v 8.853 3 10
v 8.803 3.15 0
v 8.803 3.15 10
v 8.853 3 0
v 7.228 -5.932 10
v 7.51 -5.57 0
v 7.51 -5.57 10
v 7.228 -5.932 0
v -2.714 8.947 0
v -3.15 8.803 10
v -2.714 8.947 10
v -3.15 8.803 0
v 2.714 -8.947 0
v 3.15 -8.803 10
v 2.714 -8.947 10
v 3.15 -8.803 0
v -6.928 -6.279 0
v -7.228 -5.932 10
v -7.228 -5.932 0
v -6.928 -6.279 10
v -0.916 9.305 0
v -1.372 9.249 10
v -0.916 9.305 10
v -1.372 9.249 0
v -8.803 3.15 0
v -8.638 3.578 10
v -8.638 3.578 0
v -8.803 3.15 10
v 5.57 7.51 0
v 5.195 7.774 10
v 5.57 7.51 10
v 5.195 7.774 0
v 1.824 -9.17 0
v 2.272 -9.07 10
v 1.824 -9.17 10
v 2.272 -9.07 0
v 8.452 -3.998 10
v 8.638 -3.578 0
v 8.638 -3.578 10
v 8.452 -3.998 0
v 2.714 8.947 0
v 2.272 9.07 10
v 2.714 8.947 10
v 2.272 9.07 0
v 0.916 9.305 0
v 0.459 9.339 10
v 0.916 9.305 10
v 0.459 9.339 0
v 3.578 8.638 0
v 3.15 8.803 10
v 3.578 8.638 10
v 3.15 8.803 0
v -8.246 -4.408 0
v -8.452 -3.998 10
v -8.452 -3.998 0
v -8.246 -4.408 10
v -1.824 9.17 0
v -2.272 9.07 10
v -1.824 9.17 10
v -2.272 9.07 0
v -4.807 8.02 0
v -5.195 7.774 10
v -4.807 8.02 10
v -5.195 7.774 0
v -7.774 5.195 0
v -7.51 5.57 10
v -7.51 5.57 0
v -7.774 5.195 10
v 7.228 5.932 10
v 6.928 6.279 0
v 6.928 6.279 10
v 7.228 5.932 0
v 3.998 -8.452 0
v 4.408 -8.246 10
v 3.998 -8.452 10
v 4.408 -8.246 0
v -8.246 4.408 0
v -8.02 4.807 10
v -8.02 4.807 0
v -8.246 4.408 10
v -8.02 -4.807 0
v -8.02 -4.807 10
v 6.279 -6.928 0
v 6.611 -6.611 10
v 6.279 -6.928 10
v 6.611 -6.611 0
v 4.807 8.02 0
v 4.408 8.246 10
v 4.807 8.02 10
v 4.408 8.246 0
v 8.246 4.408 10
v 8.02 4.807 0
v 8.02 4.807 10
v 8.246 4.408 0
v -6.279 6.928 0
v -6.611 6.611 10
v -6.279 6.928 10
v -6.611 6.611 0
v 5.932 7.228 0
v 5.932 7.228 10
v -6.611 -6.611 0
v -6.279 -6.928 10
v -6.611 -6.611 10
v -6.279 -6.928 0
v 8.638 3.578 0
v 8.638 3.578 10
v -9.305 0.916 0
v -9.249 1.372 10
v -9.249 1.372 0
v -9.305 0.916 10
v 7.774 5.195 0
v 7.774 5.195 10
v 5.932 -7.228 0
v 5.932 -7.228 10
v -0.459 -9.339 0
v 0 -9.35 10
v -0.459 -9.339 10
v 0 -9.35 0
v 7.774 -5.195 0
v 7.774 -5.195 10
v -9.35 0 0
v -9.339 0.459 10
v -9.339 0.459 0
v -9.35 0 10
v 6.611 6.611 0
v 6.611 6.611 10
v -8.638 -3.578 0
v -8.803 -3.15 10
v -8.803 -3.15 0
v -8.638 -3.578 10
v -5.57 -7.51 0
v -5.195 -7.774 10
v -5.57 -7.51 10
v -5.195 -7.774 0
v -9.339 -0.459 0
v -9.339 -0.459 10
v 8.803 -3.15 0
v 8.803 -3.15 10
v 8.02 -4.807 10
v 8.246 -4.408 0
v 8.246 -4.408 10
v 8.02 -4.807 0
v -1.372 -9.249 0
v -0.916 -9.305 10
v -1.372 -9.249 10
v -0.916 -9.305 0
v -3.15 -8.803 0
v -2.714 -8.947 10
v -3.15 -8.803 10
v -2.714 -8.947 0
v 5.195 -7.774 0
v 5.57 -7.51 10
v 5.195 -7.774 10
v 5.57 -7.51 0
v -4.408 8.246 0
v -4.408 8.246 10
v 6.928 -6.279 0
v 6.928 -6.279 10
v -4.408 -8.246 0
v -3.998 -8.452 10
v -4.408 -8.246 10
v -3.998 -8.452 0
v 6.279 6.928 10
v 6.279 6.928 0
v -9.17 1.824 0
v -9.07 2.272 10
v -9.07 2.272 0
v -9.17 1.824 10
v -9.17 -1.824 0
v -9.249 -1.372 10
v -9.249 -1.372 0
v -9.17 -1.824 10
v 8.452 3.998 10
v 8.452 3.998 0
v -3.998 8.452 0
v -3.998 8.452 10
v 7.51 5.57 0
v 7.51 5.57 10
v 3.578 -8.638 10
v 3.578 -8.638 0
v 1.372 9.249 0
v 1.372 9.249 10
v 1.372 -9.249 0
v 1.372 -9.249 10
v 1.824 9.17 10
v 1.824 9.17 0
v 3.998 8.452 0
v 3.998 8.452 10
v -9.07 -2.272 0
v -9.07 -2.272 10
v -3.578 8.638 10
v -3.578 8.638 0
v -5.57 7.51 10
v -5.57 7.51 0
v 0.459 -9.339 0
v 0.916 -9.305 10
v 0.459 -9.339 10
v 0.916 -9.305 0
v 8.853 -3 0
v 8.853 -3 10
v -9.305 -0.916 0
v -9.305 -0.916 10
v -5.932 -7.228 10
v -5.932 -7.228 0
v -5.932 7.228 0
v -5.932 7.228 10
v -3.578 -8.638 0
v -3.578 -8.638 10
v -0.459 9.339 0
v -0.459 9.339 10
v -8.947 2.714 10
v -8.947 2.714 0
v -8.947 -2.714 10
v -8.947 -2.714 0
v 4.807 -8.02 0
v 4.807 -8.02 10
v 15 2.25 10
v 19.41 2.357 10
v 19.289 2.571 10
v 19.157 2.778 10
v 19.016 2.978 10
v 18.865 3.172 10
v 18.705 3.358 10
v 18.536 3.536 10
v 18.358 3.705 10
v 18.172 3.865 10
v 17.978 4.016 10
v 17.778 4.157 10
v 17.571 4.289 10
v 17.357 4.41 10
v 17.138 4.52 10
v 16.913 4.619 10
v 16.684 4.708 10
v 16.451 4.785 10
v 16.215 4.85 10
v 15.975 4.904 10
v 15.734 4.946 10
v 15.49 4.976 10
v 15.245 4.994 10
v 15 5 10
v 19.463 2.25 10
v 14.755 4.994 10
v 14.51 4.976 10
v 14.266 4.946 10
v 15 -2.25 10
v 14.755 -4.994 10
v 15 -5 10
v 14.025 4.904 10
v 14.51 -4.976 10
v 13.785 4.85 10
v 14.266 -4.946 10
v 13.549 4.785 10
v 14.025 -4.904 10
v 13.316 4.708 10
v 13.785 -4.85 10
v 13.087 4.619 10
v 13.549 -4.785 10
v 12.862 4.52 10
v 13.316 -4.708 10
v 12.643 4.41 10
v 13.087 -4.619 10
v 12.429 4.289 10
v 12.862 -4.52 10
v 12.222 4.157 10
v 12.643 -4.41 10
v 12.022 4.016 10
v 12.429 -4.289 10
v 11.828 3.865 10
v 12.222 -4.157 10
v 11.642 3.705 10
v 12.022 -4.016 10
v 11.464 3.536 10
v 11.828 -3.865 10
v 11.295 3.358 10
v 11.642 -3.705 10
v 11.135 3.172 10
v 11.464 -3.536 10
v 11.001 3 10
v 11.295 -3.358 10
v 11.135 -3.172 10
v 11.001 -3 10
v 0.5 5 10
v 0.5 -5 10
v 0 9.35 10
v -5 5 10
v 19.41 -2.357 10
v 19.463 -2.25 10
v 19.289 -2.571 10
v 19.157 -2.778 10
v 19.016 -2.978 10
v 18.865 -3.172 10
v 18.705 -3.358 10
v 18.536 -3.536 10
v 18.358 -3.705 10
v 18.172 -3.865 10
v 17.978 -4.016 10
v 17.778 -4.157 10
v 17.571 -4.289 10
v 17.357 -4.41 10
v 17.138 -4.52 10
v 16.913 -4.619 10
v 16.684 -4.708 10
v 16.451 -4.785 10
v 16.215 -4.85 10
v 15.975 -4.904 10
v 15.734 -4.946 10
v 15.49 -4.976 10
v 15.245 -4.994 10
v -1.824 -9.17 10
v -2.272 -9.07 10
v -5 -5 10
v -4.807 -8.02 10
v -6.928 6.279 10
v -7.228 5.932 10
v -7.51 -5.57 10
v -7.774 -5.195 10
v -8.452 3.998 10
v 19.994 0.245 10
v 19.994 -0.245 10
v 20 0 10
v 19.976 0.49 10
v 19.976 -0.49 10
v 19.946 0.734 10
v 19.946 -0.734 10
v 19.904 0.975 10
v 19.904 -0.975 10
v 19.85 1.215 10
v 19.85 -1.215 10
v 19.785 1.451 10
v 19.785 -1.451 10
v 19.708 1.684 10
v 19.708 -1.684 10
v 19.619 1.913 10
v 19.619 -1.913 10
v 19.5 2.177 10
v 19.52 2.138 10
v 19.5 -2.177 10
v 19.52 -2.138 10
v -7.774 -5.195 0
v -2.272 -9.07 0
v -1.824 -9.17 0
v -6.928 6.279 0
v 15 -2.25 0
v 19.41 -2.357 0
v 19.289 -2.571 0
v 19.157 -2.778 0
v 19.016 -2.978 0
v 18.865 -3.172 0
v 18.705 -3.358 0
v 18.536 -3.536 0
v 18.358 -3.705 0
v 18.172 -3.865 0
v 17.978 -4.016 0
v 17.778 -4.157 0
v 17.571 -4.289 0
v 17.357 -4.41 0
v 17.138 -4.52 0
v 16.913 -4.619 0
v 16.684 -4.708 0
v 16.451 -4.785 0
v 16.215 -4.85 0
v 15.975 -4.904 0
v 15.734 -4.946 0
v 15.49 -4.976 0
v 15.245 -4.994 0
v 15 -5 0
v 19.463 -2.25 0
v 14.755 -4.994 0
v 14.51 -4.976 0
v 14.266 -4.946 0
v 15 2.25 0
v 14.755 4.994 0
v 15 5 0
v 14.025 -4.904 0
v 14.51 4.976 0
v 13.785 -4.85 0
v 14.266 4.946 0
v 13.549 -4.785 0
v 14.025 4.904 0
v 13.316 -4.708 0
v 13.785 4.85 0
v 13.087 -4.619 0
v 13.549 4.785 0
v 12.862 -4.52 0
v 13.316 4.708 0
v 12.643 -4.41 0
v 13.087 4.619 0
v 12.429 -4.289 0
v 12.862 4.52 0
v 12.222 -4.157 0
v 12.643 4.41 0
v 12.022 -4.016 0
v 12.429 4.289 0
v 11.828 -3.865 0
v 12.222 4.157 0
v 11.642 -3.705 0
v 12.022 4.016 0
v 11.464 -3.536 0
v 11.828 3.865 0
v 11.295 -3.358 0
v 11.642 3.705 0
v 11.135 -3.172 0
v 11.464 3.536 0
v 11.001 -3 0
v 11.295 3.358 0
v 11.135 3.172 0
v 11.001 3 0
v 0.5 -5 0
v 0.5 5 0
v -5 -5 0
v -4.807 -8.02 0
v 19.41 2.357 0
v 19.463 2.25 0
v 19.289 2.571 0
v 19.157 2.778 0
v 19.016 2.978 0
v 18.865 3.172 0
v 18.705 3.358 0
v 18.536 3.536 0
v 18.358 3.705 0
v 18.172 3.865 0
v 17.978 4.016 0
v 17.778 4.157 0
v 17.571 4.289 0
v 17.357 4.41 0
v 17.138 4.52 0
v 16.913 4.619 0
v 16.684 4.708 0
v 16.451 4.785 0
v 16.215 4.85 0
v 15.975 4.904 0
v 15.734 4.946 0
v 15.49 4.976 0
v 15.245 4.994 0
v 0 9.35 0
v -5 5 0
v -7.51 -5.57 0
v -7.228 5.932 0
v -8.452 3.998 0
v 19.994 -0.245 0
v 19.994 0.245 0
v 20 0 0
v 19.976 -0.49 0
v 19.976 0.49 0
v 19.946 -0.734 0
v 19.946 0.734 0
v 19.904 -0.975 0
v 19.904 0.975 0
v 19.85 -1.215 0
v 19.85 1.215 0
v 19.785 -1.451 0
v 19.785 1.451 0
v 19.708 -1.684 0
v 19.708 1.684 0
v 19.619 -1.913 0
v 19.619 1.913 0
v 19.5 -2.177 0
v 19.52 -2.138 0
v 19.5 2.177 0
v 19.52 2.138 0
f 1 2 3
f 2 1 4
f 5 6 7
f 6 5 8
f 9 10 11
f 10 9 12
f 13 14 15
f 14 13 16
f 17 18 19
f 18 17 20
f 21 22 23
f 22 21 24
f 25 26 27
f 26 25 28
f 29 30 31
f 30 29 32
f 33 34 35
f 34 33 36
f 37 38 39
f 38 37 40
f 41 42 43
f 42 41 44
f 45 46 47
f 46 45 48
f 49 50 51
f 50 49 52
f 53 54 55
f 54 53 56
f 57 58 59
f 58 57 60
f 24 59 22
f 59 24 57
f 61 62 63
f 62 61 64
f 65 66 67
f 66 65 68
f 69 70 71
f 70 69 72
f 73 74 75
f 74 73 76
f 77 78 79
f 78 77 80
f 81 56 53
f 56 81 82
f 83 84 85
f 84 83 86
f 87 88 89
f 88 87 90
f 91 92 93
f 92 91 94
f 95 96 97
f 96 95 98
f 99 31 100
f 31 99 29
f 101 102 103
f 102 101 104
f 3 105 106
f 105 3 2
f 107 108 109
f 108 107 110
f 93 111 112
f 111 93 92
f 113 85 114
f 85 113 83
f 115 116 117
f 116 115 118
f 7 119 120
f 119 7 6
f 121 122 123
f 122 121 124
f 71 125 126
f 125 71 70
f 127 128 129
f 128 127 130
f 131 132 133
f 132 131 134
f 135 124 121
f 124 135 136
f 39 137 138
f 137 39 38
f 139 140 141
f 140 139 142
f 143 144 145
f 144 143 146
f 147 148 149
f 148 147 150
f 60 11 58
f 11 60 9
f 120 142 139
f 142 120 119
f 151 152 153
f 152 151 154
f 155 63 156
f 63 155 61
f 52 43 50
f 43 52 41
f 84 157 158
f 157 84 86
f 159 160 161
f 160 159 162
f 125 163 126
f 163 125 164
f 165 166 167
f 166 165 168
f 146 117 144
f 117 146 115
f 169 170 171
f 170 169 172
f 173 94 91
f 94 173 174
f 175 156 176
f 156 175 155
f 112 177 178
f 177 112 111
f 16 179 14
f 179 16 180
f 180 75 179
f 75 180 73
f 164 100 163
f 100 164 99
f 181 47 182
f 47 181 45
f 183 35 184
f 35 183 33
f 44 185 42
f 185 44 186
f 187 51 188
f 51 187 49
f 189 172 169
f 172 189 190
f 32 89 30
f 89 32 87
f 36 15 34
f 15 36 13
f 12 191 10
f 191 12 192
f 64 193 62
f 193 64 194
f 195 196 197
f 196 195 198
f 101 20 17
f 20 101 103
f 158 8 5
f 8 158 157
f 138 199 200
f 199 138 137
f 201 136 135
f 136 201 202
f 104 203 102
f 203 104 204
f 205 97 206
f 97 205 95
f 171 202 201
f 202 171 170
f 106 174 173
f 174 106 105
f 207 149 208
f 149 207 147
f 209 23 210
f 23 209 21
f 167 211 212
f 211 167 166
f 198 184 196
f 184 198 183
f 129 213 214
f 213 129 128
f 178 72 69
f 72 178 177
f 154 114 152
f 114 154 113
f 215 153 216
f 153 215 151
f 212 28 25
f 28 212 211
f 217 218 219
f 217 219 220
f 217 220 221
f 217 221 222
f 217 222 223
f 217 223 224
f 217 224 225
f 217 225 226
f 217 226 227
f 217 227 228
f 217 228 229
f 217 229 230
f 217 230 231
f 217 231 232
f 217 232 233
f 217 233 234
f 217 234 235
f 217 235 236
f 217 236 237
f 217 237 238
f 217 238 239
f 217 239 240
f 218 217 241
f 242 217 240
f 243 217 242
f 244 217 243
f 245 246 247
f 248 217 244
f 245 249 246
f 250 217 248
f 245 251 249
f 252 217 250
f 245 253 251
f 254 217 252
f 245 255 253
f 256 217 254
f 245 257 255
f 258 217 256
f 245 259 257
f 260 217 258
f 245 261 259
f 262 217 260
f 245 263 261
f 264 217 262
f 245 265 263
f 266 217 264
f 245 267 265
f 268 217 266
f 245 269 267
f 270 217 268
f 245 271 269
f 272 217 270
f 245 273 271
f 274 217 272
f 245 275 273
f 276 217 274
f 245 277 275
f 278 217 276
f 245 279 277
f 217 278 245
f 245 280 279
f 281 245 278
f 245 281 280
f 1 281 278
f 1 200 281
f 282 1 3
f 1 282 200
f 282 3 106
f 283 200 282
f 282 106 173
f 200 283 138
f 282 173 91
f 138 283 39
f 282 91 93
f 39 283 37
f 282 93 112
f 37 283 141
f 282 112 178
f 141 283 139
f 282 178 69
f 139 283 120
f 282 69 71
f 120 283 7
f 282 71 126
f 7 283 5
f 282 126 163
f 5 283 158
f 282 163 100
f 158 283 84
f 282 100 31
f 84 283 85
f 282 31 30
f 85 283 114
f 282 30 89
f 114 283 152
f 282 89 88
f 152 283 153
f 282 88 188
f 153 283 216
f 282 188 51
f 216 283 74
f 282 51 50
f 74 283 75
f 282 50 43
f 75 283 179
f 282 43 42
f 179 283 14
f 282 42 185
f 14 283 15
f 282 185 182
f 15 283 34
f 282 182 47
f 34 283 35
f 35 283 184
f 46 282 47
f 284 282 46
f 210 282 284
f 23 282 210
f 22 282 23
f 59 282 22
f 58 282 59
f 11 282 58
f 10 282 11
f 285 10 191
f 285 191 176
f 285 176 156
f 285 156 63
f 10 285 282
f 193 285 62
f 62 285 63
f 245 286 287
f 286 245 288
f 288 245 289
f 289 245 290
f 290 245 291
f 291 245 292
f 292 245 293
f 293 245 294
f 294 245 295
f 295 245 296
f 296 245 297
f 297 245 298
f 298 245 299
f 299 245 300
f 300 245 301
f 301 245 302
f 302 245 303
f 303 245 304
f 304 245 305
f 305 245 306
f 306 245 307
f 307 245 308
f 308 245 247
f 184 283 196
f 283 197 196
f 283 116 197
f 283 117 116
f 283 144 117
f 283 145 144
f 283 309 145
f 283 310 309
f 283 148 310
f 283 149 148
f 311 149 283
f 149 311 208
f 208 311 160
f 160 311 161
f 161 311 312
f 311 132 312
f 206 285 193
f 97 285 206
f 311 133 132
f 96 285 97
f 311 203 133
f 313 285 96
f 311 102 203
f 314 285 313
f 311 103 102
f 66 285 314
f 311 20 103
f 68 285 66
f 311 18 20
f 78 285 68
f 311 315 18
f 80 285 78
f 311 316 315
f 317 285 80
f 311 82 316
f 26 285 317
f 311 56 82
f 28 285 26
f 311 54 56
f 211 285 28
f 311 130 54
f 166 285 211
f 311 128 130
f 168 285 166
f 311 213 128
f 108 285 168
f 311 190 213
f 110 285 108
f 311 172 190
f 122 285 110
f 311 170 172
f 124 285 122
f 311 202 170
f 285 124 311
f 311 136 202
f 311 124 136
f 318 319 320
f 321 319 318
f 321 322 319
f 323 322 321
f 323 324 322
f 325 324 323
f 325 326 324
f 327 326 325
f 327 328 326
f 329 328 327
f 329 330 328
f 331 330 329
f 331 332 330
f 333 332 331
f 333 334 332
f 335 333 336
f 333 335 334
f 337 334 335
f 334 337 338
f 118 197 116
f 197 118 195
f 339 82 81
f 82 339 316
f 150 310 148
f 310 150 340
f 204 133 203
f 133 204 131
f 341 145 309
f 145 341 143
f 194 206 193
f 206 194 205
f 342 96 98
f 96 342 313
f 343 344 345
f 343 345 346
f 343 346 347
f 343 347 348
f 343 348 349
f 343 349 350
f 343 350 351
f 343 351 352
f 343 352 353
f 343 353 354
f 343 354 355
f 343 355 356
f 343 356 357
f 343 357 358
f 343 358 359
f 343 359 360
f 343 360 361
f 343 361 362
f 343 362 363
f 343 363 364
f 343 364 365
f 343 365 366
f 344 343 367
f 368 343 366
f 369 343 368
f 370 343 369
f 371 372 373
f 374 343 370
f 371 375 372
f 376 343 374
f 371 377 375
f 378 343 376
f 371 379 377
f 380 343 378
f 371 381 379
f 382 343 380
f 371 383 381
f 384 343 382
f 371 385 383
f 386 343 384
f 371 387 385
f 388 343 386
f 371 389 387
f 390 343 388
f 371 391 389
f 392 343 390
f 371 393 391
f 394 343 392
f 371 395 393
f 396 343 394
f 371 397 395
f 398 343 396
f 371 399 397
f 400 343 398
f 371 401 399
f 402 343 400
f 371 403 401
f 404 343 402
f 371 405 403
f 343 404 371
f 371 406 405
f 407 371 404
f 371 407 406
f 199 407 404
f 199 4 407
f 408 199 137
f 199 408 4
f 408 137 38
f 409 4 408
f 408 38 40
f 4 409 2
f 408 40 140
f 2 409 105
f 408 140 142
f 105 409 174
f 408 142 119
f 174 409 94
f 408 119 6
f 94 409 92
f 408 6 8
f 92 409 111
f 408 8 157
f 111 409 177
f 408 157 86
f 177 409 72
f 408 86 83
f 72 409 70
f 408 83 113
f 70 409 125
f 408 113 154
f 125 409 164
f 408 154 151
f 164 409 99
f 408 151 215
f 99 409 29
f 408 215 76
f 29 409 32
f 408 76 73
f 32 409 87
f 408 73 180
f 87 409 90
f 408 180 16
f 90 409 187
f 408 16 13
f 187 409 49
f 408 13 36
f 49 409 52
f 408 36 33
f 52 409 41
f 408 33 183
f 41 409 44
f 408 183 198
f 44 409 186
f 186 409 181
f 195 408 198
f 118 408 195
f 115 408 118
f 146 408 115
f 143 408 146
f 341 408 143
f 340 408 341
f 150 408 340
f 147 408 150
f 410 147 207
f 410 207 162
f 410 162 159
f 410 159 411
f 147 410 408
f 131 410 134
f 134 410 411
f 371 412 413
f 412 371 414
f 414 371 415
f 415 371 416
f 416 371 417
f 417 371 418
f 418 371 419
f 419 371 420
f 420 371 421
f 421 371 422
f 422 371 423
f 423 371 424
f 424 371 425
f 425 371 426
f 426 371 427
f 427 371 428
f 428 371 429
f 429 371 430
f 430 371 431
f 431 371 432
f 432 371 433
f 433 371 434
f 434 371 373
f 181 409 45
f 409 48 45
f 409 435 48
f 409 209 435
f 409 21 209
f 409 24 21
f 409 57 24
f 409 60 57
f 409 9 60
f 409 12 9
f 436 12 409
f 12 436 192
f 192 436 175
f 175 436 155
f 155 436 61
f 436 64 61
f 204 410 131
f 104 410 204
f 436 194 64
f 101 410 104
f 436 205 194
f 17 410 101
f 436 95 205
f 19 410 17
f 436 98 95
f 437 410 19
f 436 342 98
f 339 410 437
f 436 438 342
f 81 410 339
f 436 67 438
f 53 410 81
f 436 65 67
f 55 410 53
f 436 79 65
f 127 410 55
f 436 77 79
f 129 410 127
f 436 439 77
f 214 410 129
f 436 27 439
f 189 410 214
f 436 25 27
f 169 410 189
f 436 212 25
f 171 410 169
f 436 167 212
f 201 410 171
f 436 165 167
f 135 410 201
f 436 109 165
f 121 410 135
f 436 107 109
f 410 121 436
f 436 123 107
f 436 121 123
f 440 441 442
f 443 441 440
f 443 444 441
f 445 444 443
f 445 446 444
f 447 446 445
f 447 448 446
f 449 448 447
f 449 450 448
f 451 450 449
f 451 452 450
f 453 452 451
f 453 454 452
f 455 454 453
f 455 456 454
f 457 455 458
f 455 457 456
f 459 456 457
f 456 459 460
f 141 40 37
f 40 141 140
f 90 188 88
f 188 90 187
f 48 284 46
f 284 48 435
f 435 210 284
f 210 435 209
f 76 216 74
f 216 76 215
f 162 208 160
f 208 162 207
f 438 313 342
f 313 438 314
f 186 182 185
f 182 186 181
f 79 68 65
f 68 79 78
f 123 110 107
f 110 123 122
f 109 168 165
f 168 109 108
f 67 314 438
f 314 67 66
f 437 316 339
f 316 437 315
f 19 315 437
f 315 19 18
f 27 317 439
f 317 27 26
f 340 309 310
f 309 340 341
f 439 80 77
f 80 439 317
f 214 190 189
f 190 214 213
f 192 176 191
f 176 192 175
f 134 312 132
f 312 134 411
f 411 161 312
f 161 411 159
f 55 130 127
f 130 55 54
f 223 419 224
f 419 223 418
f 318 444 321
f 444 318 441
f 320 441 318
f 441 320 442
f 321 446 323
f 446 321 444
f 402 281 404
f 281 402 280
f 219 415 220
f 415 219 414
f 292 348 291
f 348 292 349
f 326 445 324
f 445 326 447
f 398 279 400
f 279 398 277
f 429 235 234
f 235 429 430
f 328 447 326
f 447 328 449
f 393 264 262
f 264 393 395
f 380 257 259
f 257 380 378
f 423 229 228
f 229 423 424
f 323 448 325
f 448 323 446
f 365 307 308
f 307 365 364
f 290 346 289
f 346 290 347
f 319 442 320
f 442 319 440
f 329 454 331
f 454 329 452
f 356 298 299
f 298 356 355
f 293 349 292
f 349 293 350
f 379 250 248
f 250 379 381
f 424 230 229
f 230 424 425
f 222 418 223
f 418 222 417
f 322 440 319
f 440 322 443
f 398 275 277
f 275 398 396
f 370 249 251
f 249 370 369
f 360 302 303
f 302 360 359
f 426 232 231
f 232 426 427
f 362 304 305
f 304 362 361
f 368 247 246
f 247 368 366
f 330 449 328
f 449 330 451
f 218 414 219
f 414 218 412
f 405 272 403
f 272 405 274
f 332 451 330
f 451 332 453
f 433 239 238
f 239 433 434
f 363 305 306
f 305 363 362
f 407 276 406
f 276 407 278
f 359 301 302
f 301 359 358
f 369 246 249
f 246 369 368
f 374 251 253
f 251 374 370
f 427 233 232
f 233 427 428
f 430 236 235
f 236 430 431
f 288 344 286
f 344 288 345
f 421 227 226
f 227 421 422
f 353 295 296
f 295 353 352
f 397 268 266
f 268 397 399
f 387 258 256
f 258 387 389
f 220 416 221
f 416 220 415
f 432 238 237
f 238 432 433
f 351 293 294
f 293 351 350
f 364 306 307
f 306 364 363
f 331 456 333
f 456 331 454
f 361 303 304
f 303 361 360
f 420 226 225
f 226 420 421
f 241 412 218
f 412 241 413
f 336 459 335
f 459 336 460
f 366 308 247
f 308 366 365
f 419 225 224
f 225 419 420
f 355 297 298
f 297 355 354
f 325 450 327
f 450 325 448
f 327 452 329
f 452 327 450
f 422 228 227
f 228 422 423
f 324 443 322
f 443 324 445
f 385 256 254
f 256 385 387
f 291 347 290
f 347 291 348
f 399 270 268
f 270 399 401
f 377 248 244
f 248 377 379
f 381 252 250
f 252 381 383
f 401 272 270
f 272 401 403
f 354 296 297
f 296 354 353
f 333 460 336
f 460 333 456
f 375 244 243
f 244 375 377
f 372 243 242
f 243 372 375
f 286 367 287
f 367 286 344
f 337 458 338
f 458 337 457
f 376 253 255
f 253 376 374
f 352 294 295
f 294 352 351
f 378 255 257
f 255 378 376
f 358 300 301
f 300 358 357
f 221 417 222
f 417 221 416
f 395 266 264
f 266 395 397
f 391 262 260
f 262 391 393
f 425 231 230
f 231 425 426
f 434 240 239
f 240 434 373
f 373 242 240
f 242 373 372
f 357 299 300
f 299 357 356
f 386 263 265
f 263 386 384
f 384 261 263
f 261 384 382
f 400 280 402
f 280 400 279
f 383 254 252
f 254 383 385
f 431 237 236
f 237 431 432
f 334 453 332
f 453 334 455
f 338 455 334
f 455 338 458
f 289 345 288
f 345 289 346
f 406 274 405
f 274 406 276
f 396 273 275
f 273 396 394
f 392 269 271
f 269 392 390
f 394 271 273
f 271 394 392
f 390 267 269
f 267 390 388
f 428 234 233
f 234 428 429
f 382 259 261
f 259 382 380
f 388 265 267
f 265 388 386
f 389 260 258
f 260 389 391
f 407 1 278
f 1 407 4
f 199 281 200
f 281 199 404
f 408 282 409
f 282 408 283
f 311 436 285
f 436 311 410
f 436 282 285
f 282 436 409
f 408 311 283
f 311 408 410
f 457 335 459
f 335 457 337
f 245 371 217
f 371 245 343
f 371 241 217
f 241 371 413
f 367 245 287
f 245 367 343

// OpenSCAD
// Tubing clip for a 12.7 mm (1/2 inch) lab stand rod
// Print orientation: flat on the bed, extruded upward in +Z

// ---------------- Parameters ----------------
rod_d        = 12.7;   // stand rod diameter
ring_wall    = 3;      // rod ring wall thickness
ring_od      = rod_d + 2 * ring_wall;  // rod ring outer diameter (18.7 mm)
opening_w    = 10;     // rod ring opening width (along Y)
opening_x0   = -5;     // opening centre X position

tube_d       = 6;      // tubing inner diameter
tube_wall    = 2;      // tubing wall thickness
tube_od      = tube_d + 2 * tube_wall; // tubing outer diameter (10 mm)
tube_x       = 15;     // tubing ring centre X position
opening_t    = 4.5;    // tubing opening width (along Y)

bridge_w     = 6;      // bridge width (along Y)
bridge_x0    = 8;      // bridge left edge (X)
bridge_x1    = 12;     // bridge right edge (X)

eps          = 0.5;    // cutter overshoot past faces
$fn          = 128;    // circle resolution

// ---------------- Model ----------------
difference() {
    union() {
        // Rod ring
        cylinder(d = ring_od, h = 10);

        // Tubing ring
        translate([tube_x, 0, 0])
            cylinder(d = tube_od, h = 10);

        // Solid bridge between the rings
        translate([bridge_x0, -bridge_w / 2, 0])
            cube([bridge_x1 - bridge_x0, bridge_w, 10]);
    }

    // Rod ring opening: removes everything with x < 0 and -5 < y < 5
    translate([opening_x0, -opening_w / 2, -eps])
        cube([opening_w / 2 + eps, opening_w, 10 + 2 * eps]);

    // Tubing opening: removes x > 15 and -2.25 < y < 2.25
    translate([tube_x, -opening_t / 2, -eps])
        cube([opening_t, opening_t, 10 + 2 * eps]);
}
